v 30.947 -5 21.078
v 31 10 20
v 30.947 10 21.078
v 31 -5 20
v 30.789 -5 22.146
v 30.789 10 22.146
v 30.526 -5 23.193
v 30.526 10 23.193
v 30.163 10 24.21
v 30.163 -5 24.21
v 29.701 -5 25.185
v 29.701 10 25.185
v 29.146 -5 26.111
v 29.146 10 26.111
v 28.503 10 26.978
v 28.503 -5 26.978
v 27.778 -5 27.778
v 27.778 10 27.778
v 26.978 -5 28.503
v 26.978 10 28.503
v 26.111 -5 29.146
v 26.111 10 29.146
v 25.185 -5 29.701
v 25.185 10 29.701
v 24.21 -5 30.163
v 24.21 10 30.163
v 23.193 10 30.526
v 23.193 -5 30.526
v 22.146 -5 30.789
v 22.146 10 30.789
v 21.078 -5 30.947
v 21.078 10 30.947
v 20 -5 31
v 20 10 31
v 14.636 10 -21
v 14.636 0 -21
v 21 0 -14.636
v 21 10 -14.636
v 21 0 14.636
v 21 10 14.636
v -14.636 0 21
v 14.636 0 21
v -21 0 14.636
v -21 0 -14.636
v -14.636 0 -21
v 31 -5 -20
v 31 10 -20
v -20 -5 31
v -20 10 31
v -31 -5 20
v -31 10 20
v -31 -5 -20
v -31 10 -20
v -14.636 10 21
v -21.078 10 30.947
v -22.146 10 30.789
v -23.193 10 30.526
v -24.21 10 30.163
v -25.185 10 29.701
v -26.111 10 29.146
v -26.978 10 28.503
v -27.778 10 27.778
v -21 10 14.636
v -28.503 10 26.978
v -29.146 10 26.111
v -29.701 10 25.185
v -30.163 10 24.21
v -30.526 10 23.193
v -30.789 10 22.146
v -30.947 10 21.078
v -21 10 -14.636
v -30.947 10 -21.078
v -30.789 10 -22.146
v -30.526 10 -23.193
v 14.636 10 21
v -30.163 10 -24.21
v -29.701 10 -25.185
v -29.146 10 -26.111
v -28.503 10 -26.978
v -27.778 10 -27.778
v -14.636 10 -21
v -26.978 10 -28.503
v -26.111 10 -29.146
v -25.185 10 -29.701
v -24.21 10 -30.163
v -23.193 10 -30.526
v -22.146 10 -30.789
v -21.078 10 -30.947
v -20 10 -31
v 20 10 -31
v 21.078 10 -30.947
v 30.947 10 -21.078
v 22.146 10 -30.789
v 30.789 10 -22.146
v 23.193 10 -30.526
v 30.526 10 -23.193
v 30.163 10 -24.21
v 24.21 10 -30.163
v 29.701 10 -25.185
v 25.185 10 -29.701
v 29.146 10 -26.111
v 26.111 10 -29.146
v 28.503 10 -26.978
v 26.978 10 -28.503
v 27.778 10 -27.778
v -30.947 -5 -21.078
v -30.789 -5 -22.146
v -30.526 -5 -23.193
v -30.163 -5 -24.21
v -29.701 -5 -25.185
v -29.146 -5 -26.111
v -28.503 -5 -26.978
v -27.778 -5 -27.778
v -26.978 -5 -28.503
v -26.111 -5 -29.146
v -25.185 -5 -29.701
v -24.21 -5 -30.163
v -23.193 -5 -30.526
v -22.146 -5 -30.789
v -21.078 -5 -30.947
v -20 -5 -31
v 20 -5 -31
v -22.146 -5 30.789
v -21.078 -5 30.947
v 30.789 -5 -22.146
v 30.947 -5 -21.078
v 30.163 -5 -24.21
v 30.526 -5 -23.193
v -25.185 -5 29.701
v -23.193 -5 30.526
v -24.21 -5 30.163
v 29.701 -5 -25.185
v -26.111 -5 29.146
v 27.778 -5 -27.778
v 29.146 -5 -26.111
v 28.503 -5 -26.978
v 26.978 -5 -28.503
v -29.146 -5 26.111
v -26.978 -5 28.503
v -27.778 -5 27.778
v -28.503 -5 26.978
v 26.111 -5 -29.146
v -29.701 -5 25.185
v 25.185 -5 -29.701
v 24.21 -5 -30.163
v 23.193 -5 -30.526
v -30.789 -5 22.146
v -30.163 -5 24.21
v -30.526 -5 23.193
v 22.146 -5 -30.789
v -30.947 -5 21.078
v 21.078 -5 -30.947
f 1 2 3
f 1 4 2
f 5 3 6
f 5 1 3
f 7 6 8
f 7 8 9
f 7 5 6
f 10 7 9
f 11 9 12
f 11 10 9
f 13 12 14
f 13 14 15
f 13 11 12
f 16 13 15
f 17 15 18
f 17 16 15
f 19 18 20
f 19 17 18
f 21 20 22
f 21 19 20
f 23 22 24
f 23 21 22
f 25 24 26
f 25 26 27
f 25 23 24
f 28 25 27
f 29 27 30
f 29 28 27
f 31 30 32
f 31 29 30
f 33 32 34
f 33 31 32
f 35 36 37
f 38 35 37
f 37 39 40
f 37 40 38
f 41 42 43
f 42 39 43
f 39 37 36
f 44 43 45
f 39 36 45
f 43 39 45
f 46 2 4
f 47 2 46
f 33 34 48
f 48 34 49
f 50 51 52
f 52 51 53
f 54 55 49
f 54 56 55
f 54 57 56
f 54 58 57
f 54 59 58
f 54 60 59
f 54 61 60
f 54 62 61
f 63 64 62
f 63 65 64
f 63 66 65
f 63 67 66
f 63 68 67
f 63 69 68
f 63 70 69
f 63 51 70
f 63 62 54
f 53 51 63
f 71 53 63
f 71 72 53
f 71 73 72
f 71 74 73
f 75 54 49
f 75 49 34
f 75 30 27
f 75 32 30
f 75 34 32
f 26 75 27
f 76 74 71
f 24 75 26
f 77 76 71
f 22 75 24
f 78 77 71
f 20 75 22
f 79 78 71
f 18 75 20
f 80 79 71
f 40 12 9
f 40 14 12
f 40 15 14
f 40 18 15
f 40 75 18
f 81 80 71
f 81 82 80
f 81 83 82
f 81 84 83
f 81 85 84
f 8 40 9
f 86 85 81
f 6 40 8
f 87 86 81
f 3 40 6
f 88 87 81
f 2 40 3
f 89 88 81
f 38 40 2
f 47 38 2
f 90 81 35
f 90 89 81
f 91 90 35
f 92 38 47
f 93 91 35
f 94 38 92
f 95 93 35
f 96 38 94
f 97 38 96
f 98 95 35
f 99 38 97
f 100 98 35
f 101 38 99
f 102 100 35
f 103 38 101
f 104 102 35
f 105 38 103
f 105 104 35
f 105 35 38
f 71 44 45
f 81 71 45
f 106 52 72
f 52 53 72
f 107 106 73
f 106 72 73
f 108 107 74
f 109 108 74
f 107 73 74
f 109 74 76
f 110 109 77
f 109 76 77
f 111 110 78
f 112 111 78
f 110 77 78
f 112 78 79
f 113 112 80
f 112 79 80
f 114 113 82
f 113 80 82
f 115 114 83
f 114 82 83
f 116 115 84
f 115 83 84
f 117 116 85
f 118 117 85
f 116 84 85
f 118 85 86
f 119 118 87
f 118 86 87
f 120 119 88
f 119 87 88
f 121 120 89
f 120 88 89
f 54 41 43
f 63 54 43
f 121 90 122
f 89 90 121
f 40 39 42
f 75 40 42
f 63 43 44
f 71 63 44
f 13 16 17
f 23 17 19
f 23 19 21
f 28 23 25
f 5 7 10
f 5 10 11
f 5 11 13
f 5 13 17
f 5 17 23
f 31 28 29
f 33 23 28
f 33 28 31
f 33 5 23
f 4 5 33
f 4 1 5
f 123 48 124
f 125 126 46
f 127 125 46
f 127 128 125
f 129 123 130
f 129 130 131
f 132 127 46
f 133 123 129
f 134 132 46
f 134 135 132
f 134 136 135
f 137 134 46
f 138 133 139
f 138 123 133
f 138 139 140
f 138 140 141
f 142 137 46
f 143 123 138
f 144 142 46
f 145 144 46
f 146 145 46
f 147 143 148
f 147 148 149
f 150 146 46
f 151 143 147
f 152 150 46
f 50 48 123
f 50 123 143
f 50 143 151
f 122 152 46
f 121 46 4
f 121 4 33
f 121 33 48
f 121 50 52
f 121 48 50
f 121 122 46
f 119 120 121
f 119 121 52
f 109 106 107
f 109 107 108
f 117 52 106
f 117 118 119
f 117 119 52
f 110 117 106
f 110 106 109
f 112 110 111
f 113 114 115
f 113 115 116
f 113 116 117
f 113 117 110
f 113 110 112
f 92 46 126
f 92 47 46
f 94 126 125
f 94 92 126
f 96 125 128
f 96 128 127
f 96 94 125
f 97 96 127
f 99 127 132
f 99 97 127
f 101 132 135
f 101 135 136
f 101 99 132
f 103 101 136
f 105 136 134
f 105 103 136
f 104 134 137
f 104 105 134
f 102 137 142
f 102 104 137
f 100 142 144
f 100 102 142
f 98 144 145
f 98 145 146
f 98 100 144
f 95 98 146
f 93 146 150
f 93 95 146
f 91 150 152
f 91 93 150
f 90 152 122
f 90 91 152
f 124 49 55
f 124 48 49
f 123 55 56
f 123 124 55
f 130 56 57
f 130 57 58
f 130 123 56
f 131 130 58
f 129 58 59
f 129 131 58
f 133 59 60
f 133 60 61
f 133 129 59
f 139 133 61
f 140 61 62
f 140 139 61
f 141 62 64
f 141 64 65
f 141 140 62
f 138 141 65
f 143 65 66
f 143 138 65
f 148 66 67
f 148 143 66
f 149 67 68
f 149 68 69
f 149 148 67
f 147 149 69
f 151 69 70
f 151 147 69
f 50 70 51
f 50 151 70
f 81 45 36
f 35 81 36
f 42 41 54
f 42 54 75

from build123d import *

# Parameters (mm, degrees)
SKETCH1_W           = 62
SKETCH1_H           = 62
SKETCH1_W_2         = 42
SKETCH1_H_2         = 42
BOSS_EXTRUDE1_DEPTH = 10
SKETCH2_W           = 62
SKETCH2_H           = 62
BOSS_EXTRUDE2_DEPTH = 5
FILLET1_R           = 11


with BuildPart() as part:
    # Sketch1 → Boss-Extrude1 (new body)
    # profile 1 of 5: a face of its own
    with BuildSketch(Plane(origin=(0, 0, 0), x_dir=(1, 0, 0), z_dir=(0, 1, 0))):
        Rectangle(SKETCH1_W, SKETCH1_H)
        Rectangle(SKETCH1_W_2, SKETCH1_H_2, mode=Mode.SUBTRACT)
    # profile 2 of 5: a face of its own
    with BuildSketch(Plane(origin=(0, 0, 0), x_dir=(1, 0, 0), z_dir=(0, 1, 0))):
        Polygon((21, -21), (21, -14.636038969), (14.636038969, -21), align=None)
    # profile 3 of 5: a face of its own
    with BuildSketch(Plane(origin=(0, 0, 0), x_dir=(1, 0, 0), z_dir=(0, 1, 0))):
        Polygon((14.636038969, 21), (21, 14.636038969), (21, 21), align=None)
    # profile 4 of 5: a face of its own
    with BuildSketch(Plane(origin=(0, 0, 0), x_dir=(1, 0, 0), z_dir=(0, 1, 0))):
        Polygon((-21, 14.636038969), (-14.636038969, 21), (-21, 21), align=None)
    # profile 5 of 5: a face of its own
    with BuildSketch(Plane(origin=(0, 0, 0), x_dir=(1, 0, 0), z_dir=(0, 1, 0))):
        Polygon((-21, -21), (-14.636038969, -21), (-21, -14.636038969), align=None)
    extrude(amount=BOSS_EXTRUDE1_DEPTH)

    # Sketch2 → Boss-Extrude2 (add)
    with BuildSketch(Plane(origin=(0, 0, 0), x_dir=(-1, 0, 0), z_dir=(0, -1, 0))):
        Rectangle(SKETCH2_W, SKETCH2_H)
    extrude(amount=BOSS_EXTRUDE2_DEPTH)

    # Fillet1
    fillet1_edges = [part.edges().sort_by_distance(p)[0] for p in [
        (-31, 2.5, 31),
        (-31, 2.5, -31),
        (31, 2.5, -31),
        (31, 2.5, 31),
    ]]
    fillet(fillet1_edges, radius=FILLET1_R)


solid = part.part
